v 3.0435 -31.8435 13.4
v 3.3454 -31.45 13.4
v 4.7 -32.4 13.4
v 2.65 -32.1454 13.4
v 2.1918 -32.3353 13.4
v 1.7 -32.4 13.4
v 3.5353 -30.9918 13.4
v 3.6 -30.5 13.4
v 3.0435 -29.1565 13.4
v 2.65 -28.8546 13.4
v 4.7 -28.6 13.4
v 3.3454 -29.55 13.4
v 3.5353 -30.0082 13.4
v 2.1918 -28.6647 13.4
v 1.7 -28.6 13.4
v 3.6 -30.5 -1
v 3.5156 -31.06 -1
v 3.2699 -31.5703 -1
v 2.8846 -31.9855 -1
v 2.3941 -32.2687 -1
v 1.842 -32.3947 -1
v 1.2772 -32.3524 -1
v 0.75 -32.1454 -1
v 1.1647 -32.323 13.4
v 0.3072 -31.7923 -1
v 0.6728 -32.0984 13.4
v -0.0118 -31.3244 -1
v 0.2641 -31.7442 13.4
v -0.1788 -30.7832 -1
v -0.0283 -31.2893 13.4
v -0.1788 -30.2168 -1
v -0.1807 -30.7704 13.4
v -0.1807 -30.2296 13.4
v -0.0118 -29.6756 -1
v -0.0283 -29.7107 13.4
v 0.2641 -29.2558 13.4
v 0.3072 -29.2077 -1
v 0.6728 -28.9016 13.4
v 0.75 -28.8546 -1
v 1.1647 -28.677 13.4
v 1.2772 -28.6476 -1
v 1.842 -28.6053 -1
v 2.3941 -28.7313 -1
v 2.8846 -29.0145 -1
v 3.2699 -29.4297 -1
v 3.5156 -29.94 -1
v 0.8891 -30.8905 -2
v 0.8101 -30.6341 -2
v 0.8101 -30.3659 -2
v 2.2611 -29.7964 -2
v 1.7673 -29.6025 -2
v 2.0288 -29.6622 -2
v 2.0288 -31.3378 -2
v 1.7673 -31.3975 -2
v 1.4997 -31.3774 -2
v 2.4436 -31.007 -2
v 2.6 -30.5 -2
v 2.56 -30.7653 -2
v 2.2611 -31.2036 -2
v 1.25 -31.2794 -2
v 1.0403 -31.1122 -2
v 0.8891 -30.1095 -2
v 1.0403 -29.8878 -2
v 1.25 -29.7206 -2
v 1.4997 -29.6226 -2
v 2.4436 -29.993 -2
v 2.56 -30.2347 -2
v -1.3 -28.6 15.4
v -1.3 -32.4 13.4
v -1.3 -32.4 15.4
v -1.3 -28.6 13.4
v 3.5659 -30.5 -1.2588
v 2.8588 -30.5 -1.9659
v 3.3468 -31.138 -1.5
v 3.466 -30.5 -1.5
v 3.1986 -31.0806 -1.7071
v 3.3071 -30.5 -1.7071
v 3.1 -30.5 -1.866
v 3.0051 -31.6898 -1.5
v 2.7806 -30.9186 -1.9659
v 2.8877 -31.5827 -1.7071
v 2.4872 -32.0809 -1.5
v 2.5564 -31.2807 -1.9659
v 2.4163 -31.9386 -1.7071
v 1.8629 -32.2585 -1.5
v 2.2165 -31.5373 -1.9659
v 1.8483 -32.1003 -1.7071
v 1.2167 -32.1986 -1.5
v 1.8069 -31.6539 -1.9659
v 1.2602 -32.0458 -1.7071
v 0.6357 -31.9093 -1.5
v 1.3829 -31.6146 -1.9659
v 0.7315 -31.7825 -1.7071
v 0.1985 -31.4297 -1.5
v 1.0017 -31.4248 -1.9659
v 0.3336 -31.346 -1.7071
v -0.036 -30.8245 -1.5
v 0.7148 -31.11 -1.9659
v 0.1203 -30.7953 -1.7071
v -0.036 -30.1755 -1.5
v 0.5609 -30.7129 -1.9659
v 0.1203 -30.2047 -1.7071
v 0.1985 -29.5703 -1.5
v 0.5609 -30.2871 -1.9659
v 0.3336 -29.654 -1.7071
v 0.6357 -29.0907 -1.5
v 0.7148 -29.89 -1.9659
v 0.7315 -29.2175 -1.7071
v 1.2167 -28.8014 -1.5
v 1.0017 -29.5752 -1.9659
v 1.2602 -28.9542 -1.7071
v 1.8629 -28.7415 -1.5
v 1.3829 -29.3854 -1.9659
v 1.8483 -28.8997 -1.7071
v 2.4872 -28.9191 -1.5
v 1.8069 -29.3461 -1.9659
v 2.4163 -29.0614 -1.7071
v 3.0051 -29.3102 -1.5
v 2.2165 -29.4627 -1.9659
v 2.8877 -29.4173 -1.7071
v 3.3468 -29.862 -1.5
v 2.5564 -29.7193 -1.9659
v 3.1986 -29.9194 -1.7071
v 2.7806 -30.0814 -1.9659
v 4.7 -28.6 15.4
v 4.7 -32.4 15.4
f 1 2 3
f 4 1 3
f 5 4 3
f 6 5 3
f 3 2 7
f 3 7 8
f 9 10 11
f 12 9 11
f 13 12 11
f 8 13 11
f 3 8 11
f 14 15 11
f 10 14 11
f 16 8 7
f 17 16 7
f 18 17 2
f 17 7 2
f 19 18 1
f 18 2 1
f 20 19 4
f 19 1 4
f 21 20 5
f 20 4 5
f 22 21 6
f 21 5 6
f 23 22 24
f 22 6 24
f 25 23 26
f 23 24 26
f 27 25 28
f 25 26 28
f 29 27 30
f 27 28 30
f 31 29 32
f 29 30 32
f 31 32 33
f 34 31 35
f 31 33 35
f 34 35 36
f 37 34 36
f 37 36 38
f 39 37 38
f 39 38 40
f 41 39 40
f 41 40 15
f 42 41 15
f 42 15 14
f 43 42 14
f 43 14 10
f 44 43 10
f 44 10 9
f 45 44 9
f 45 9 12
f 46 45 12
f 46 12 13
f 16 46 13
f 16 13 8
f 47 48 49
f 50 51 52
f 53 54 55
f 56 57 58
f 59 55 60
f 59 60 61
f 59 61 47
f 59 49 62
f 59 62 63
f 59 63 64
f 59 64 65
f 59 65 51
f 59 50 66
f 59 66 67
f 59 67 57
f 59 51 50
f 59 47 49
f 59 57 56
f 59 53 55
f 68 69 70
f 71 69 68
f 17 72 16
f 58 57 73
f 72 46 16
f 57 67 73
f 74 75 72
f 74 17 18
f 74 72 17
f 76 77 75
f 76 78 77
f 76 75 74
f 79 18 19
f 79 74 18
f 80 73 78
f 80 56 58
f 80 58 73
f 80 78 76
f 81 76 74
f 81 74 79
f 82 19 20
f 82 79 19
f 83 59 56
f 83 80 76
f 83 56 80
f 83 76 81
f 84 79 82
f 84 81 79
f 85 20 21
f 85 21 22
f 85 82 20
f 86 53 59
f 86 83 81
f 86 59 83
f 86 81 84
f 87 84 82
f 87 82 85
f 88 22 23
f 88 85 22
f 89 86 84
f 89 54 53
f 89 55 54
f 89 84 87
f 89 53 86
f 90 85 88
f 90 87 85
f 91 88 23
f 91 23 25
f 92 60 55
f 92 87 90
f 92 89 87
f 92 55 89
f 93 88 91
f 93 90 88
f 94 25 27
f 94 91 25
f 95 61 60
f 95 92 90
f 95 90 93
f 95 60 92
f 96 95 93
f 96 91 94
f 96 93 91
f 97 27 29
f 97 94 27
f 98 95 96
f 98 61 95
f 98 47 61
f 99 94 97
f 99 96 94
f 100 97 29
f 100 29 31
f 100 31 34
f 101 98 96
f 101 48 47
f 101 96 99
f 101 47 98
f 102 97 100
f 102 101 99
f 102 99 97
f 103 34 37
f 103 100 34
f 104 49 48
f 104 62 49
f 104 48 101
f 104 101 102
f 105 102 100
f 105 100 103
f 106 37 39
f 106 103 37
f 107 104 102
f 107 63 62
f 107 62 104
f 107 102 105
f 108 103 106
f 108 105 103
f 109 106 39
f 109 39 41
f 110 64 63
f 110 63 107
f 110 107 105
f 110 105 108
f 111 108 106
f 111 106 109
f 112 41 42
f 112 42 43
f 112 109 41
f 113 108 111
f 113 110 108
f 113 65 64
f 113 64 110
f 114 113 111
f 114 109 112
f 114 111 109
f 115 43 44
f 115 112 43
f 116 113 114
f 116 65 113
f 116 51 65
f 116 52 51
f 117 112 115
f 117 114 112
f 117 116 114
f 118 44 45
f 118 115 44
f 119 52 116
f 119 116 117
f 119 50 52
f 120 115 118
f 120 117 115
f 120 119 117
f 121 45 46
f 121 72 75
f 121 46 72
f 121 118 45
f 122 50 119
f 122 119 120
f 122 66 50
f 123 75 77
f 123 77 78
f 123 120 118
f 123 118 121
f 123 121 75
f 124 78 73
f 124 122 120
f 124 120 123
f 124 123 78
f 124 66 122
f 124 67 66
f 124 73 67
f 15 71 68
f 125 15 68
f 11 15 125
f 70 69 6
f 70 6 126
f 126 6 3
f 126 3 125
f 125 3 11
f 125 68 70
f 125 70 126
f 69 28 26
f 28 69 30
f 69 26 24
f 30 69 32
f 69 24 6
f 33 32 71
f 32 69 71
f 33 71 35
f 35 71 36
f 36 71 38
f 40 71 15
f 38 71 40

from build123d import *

# Parameters (mm, degrees)
SKETCH029_W  = 6
SKETCH029_H  = 3.8
PAD012_DEPTH = 2
SKETCH033_R  = 1.9
PAD016_DEPTH = 15.4
FILLET012_R  = 1


with BuildPart() as part:
    # Sketch029 → Pad012 (new body)
    with BuildSketch(Plane.XY.offset(13.4)):
        with Locations((1.7, -30.5)):
            Rectangle(SKETCH029_W, SKETCH029_H)
    extrude(amount=PAD012_DEPTH)

    # Sketch033 (on Face5 of Pad012) → Pad016 (join)
    with BuildSketch(Plane(origin=(0, 0, 13.4), x_dir=(1, 0, 0), z_dir=(0, 0, -1))):
        with Locations((1.7, 30.5)):
            Circle(SKETCH033_R)
    extrude(amount=PAD016_DEPTH)

    # Fillet012
    fillet012_edges = [part.edges().sort_by_distance(p)[0] for p in [
        (-0.2, -30.5, -2),
    ]]
    fillet(fillet012_edges, radius=FILLET012_R)


solid = part.part
